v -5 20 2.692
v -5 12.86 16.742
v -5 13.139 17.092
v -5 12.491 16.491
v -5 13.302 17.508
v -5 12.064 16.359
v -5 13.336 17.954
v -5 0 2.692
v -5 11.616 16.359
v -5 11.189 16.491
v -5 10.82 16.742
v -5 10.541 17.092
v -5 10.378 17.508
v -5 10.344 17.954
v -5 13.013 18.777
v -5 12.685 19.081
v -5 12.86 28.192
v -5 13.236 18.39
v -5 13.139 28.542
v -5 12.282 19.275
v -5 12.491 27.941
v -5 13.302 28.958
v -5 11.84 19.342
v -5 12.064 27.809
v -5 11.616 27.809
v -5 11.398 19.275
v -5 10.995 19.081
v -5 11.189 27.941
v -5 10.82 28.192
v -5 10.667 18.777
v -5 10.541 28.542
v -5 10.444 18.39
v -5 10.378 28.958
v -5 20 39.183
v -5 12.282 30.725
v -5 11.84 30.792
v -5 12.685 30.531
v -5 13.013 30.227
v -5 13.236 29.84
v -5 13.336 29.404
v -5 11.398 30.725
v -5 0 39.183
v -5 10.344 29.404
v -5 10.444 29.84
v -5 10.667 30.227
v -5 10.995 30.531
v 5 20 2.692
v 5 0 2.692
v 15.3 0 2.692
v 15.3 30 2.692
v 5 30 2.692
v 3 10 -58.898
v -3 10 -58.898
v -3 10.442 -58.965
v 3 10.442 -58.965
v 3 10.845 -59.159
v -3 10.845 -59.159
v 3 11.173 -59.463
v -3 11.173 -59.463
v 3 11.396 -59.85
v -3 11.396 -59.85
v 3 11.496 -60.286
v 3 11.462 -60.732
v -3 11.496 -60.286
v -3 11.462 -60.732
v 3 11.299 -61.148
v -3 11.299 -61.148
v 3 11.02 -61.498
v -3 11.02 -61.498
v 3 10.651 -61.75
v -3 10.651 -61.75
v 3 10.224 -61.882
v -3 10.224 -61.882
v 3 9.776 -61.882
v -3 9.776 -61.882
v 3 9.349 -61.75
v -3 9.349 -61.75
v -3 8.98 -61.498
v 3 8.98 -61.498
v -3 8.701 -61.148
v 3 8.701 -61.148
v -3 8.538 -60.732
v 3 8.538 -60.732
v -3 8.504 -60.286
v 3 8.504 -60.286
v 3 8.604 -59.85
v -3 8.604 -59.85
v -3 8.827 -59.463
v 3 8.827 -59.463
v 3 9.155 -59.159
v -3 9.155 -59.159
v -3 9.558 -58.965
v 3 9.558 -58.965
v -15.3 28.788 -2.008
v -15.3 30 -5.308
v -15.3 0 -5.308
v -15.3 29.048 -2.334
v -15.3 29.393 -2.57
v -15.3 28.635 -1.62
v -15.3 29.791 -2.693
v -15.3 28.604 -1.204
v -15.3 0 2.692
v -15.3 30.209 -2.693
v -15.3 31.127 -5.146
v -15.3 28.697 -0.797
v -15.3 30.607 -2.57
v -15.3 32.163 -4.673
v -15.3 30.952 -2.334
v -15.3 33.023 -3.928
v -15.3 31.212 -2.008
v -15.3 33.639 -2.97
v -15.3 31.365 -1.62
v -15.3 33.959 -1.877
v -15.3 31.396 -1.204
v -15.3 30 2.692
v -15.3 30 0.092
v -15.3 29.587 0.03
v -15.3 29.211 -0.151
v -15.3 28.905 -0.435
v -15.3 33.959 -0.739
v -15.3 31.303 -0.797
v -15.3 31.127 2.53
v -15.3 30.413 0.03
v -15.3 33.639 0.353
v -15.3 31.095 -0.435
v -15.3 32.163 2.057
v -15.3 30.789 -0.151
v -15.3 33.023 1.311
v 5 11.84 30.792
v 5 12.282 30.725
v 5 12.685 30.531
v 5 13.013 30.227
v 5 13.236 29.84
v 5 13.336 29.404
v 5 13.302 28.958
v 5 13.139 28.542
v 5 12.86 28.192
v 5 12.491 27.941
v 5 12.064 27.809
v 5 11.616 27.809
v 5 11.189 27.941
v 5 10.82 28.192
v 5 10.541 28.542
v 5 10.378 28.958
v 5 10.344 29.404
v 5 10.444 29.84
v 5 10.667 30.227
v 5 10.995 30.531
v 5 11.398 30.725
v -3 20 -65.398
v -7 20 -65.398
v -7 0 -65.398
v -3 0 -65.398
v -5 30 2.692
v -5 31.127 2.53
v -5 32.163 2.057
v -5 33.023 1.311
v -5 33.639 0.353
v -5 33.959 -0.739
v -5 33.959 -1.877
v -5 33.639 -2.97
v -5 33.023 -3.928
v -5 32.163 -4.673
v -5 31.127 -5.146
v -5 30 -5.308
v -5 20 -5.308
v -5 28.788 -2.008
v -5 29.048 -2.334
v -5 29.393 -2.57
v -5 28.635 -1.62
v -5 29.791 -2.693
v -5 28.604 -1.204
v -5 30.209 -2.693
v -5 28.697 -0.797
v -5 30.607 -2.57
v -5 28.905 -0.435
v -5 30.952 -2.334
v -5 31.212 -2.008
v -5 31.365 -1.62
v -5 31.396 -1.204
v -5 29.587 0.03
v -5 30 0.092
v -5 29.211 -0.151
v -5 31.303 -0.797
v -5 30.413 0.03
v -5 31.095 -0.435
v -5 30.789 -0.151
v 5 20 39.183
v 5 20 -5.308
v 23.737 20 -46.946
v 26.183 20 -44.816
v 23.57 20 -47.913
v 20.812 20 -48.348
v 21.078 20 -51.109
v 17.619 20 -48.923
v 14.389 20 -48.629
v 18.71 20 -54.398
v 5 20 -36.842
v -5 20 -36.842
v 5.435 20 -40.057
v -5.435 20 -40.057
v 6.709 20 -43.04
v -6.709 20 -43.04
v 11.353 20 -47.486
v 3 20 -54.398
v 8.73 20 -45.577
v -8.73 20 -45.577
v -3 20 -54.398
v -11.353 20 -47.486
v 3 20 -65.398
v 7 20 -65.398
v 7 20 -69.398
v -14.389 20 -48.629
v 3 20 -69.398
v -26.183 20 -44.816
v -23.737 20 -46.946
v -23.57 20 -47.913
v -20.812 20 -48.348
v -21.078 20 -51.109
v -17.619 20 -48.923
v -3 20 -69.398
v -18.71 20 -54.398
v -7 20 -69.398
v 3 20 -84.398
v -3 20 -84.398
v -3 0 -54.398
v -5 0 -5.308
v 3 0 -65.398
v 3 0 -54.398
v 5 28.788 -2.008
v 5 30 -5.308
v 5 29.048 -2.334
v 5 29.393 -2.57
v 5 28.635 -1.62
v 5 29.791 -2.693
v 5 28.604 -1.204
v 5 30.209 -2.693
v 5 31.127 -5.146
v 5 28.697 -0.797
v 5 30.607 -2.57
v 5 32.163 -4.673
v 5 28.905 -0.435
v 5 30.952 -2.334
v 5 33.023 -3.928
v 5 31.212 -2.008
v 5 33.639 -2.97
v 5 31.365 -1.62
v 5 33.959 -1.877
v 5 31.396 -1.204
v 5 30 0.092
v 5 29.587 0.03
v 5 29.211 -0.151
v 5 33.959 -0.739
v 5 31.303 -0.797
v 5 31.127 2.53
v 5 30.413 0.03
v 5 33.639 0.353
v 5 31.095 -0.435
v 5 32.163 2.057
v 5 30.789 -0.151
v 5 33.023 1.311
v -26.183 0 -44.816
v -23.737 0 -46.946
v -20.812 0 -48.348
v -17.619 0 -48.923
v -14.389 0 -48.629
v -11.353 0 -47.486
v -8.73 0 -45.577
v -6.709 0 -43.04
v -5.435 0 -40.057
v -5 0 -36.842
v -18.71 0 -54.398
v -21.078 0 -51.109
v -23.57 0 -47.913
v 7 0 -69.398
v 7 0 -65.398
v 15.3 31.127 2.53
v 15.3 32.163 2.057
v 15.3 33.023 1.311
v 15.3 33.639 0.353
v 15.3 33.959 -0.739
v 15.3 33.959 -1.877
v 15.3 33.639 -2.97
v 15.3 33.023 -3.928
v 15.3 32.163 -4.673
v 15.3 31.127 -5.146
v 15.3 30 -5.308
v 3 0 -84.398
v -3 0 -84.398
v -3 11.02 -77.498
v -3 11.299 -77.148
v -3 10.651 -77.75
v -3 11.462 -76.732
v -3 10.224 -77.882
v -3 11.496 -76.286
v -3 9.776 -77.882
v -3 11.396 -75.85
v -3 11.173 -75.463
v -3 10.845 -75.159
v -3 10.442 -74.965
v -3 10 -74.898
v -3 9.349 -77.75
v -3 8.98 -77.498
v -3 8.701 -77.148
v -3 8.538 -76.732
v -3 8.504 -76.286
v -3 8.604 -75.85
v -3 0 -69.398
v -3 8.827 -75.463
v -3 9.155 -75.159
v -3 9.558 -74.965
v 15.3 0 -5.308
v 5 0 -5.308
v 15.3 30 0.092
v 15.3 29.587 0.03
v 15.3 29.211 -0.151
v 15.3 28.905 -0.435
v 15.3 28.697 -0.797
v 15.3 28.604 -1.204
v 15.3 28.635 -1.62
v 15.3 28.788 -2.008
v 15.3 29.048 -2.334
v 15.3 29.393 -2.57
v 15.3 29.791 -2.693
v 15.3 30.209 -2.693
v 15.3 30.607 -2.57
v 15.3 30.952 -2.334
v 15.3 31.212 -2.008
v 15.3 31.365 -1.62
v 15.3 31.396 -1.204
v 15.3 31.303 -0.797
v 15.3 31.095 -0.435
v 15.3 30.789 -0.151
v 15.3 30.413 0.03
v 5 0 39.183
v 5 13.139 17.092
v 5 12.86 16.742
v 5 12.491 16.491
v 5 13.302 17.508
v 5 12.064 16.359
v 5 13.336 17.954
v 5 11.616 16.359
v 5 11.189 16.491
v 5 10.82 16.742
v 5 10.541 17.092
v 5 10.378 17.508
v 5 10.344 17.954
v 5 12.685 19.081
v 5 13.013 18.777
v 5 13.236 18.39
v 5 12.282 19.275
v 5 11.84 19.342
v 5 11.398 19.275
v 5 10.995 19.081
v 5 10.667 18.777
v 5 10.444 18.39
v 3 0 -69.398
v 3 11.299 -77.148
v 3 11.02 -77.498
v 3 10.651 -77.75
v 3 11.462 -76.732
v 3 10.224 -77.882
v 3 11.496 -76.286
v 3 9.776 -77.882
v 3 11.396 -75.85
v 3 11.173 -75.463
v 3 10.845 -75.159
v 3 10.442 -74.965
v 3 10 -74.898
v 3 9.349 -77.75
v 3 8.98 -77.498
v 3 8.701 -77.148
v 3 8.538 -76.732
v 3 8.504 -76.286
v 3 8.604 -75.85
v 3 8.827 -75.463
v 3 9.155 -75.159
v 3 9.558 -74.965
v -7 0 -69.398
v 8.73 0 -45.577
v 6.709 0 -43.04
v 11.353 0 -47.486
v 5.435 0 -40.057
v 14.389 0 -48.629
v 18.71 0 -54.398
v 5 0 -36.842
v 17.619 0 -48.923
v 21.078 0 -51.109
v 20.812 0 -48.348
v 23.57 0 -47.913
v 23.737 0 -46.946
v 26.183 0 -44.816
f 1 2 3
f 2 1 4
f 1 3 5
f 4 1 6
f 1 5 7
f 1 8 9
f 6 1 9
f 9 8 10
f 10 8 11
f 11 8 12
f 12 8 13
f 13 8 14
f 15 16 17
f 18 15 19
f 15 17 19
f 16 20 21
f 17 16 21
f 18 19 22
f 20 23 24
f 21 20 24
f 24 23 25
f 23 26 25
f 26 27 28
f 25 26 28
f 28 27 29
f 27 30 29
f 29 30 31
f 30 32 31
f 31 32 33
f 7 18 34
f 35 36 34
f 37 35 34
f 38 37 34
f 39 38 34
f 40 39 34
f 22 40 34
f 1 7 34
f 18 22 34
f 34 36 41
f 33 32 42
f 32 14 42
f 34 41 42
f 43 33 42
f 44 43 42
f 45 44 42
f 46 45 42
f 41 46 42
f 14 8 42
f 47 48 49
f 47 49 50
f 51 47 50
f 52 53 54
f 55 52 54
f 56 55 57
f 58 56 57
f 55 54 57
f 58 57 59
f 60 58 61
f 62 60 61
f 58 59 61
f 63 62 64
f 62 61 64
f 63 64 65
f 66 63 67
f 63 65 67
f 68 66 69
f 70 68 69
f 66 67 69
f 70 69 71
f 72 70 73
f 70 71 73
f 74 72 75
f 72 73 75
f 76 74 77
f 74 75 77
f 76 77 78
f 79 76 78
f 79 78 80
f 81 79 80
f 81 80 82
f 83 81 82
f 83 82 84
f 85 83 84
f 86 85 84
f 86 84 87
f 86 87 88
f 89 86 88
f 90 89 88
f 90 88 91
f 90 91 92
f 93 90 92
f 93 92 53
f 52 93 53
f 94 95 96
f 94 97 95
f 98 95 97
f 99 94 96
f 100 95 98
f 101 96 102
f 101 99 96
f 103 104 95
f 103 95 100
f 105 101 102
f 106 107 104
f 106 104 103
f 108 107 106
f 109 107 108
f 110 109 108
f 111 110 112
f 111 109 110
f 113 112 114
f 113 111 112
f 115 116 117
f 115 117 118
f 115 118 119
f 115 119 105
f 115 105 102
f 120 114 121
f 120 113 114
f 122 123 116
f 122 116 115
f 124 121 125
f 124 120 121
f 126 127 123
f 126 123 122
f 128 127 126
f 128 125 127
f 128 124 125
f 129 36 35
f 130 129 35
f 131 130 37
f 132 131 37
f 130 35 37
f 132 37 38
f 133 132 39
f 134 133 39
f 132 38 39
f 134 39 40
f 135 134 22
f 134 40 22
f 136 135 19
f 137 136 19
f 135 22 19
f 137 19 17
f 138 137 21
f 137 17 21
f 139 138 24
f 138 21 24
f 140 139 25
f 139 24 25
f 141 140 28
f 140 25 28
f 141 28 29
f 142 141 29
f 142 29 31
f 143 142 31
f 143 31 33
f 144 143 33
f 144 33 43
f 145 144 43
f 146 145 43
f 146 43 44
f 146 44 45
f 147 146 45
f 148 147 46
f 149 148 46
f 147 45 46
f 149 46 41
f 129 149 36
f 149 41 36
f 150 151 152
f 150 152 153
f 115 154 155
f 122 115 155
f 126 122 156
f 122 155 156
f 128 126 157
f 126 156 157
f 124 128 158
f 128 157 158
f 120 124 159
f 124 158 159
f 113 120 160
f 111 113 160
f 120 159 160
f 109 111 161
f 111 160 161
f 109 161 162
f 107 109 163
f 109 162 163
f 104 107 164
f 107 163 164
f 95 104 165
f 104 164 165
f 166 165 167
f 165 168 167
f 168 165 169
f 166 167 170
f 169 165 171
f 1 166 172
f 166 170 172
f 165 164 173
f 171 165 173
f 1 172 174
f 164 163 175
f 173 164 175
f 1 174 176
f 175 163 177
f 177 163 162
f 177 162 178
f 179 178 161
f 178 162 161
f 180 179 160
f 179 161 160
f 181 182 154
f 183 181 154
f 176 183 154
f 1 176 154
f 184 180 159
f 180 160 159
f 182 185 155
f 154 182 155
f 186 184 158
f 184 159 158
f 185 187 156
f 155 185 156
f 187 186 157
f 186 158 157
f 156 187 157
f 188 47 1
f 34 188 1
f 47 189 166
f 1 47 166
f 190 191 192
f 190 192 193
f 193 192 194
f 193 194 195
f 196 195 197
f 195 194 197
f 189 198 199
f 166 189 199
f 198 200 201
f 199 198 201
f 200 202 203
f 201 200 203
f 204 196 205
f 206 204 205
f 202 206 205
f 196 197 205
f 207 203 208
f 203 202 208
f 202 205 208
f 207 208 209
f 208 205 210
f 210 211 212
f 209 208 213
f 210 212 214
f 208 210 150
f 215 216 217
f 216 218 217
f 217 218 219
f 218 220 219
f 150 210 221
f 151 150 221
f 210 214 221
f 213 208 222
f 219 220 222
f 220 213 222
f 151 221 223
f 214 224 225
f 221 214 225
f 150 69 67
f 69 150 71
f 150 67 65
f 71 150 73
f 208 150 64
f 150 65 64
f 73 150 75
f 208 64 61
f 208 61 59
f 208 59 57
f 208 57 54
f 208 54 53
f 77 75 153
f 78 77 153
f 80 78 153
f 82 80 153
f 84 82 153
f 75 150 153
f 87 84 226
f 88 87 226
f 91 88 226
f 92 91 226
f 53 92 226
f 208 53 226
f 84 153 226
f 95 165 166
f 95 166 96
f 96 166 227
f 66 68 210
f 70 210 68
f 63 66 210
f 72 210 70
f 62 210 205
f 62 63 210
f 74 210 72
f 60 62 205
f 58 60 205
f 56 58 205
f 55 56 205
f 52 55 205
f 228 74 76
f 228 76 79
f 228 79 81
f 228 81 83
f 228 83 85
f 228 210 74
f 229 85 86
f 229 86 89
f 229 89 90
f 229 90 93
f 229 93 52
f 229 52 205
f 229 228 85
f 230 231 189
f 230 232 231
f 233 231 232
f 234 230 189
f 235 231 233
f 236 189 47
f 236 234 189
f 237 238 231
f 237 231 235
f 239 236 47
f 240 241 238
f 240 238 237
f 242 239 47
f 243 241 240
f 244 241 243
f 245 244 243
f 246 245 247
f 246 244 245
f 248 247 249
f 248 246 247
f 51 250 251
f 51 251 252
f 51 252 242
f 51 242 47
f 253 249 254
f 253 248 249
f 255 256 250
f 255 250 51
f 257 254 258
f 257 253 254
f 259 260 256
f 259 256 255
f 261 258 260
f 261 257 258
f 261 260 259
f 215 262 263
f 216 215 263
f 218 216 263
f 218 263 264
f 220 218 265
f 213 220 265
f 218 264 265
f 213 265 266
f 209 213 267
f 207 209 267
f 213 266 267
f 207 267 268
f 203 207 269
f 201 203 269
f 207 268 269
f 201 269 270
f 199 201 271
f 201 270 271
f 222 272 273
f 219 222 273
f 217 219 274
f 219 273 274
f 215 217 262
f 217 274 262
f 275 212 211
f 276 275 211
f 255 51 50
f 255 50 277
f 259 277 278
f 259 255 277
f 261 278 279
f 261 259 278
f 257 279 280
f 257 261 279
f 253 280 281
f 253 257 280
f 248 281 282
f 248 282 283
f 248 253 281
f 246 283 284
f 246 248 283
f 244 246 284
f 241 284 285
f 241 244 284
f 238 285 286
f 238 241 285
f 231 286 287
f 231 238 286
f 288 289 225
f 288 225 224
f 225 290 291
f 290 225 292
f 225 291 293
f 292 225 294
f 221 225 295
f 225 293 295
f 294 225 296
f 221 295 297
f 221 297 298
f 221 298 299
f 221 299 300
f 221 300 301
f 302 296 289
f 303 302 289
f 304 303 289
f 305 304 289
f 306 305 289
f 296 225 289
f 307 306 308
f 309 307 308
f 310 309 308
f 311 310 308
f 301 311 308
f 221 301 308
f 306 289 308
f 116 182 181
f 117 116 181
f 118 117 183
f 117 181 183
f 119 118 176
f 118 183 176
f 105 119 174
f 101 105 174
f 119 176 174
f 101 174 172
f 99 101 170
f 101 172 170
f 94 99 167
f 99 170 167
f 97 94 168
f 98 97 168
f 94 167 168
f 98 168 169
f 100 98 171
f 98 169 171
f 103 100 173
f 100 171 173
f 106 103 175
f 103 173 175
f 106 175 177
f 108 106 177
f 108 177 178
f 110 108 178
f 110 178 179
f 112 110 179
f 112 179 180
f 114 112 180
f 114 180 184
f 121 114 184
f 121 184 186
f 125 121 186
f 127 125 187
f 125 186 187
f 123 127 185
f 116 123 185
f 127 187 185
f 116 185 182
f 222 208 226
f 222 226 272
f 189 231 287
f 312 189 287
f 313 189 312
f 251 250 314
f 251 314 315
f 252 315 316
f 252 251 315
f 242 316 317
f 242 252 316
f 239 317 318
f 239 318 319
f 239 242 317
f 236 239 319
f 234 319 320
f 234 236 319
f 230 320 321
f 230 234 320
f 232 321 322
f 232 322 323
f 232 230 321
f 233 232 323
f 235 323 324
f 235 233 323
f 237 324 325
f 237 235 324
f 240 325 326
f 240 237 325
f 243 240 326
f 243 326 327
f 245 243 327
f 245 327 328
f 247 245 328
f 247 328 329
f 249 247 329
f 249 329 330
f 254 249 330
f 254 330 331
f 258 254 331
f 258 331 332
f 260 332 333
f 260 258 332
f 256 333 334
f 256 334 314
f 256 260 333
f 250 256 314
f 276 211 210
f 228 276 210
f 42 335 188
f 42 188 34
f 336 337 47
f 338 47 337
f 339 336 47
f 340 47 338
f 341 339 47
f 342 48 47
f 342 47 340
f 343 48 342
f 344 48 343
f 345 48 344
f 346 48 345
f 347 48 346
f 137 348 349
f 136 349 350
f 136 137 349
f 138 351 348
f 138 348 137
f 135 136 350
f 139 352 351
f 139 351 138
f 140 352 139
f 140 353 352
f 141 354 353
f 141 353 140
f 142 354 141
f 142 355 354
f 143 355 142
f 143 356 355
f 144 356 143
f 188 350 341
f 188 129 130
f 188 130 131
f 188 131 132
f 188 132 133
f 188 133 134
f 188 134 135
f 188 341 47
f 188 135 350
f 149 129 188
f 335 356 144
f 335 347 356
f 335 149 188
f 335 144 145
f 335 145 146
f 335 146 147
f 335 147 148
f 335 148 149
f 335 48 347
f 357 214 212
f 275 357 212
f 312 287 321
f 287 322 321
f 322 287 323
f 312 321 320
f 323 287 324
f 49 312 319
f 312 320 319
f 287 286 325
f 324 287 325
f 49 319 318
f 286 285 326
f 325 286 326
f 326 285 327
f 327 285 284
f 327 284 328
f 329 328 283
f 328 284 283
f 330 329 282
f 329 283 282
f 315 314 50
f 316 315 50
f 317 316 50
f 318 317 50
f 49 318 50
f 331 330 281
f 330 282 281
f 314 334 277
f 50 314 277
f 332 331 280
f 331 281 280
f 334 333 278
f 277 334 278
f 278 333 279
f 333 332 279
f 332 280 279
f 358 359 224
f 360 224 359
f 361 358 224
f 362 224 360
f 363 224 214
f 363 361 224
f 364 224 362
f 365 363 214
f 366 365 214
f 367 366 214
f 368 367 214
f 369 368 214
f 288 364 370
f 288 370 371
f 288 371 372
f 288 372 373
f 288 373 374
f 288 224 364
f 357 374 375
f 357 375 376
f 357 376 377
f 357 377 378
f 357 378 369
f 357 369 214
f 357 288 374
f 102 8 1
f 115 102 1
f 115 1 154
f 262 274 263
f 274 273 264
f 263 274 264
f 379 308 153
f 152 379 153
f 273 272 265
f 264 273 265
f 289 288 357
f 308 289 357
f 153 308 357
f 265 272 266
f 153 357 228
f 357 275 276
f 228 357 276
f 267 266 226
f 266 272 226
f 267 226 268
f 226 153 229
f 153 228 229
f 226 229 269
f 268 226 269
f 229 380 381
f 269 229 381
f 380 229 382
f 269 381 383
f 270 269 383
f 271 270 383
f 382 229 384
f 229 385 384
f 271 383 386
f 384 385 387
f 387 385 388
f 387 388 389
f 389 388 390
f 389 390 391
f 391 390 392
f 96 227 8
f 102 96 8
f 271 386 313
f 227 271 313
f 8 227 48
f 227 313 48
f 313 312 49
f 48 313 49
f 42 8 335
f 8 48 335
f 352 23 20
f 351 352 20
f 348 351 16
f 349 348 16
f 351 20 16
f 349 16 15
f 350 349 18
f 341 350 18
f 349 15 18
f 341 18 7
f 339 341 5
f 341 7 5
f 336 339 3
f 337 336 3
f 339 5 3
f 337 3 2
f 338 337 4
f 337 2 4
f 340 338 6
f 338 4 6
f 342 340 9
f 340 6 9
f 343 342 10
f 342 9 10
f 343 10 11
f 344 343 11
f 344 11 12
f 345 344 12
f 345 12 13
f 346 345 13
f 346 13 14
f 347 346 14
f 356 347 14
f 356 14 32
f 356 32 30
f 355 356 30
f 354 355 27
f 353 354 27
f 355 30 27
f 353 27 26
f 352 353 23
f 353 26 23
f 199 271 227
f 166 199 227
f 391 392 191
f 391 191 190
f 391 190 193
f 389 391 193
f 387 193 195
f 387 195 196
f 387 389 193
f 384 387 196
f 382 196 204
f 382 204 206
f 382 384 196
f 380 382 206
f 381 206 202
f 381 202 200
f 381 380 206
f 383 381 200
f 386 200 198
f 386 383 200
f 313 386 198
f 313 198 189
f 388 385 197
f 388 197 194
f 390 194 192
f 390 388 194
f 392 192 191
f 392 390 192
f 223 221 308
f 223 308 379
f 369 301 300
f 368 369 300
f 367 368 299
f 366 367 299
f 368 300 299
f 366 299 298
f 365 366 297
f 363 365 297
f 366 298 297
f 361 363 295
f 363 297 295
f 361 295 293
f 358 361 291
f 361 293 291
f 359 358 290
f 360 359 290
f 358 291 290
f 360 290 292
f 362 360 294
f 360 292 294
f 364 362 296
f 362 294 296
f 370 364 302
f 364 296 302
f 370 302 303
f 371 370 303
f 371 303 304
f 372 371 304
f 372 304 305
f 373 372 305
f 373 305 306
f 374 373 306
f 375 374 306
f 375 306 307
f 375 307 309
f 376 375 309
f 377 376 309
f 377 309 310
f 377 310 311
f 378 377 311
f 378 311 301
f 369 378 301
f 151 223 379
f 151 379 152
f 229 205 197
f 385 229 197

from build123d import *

# Parameters (mm, degrees)
BOSS_EXTRU_1_DEPTH      = 20
ESQUISSE3_R             = 1.5
ENL_V_MAT_EXTRU_3_DEPTH = 20
ESQUISSE4_R             = 1.5
ENL_V_MAT_EXTRU_4_DEPTH = 10
ESQUISSE5_R             = 1.5
ENL_V_MAT_EXTRU_5_DEPTH = 10
ESQUISSE6_R             = 1.4
BOSS_EXTRU_2_DEPTH      = 10.3


with BuildPart() as part:
    # Esquisse1 → Boss.-Extru.1 (new body)
    with BuildSketch(Plane(origin=(0, 0, 0), x_dir=(1, 0, 0), z_dir=(0, 1, 0))):
        with BuildLine():
            Line((-3, 84.398281038), (-3, 69.398281038))
            Line((-3, 69.398281038), (-7, 69.398281038))
            Line((-7, 69.398281038), (-7, 65.398281038))
            Line((-7, 65.398281038), (-3, 65.398281038))
            Line((-3, 65.398281038), (-3, 54.398281038))
            Line((-3, 54.398281038), (-18.71, 54.398281038))
            ThreePointArc((-18.71, 54.398281038), (-22.308577777, 49.499317693), (-26.183329952, 44.81574006))
            ThreePointArc((-26.183329952, 44.81574006), (-12.83252844, 48.159570073), (-5, 36.842476876))
            Line((-5, 36.842476876), (-5, -39.182739587))
            Line((-5, -39.182739587), (0, -39.182739587))
            Line((0, -39.182739587), (0, 84.398281038))
            Line((0, 84.398281038), (-3, 84.398281038))
        make_face()
    boss_extru_1 = extrude(amount=BOSS_EXTRU_1_DEPTH)

    # Symétrie1: Boss.-Extru.1 across plane
    add(boss_extru_1.mirror(Plane(origin=(0, 20, -84.398281038), x_dir=(0, 0, 1), z_dir=(-1, 0, 0))))

    # Esquisse3 → Enlèv. mat.-Extru.3 (cut)
    with BuildSketch(Plane.ZY.offset(3)):
        with Locations((-76.398281038, 10)):
            Circle(ESQUISSE3_R)
        with Locations((-60.398281038, 10)):
            Circle(ESQUISSE3_R)
    extrude(amount=-ENL_V_MAT_EXTRU_3_DEPTH, mode=Mode.SUBTRACT)

    # Esquisse4 → Enlèv. mat.-Extru.4 (cut)
    with BuildSketch(Plane.ZY.offset(5)):
        with Locations((29.291975875, 11.84)):
            Circle(ESQUISSE4_R)
    extrude(amount=-ENL_V_MAT_EXTRU_4_DEPTH, mode=Mode.SUBTRACT)

    # Esquisse5 → Enlèv. mat.-Extru.5 (cut)
    with BuildSketch(Plane.ZY.offset(5)):
        with Locations((17.841975875, 11.84)):
            Circle(ESQUISSE5_R)
    extrude(amount=-ENL_V_MAT_EXTRU_5_DEPTH, mode=Mode.SUBTRACT)

    # Esquisse6 → Boss.-Extru.2 (add)
    with BuildSketch(Plane(origin=(5, 0, 0), x_dir=(0, 0, -1), z_dir=(1, 0, 0))):
        with BuildLine():
            Line((5.308208853, 0), (-2.691791147, 0))
            Line((-2.691791147, 0), (-2.691791147, 30))
            ThreePointArc((-2.691791147, 30), (1.308208853, 34), (5.308208853, 30))
            Line((5.308208853, 30), (5.308208853, 0))
        make_face()
        with Locations(Location((1.308208853, 30, 0), (0, 0, 180))):
            Circle(ESQUISSE6_R, mode=Mode.SUBTRACT)
    boss_extru_2 = extrude(amount=BOSS_EXTRU_2_DEPTH)

    # Symétrie2: Boss.-Extru.2 across plane
    add(boss_extru_2.mirror(Plane.ZY))


solid = part.part
